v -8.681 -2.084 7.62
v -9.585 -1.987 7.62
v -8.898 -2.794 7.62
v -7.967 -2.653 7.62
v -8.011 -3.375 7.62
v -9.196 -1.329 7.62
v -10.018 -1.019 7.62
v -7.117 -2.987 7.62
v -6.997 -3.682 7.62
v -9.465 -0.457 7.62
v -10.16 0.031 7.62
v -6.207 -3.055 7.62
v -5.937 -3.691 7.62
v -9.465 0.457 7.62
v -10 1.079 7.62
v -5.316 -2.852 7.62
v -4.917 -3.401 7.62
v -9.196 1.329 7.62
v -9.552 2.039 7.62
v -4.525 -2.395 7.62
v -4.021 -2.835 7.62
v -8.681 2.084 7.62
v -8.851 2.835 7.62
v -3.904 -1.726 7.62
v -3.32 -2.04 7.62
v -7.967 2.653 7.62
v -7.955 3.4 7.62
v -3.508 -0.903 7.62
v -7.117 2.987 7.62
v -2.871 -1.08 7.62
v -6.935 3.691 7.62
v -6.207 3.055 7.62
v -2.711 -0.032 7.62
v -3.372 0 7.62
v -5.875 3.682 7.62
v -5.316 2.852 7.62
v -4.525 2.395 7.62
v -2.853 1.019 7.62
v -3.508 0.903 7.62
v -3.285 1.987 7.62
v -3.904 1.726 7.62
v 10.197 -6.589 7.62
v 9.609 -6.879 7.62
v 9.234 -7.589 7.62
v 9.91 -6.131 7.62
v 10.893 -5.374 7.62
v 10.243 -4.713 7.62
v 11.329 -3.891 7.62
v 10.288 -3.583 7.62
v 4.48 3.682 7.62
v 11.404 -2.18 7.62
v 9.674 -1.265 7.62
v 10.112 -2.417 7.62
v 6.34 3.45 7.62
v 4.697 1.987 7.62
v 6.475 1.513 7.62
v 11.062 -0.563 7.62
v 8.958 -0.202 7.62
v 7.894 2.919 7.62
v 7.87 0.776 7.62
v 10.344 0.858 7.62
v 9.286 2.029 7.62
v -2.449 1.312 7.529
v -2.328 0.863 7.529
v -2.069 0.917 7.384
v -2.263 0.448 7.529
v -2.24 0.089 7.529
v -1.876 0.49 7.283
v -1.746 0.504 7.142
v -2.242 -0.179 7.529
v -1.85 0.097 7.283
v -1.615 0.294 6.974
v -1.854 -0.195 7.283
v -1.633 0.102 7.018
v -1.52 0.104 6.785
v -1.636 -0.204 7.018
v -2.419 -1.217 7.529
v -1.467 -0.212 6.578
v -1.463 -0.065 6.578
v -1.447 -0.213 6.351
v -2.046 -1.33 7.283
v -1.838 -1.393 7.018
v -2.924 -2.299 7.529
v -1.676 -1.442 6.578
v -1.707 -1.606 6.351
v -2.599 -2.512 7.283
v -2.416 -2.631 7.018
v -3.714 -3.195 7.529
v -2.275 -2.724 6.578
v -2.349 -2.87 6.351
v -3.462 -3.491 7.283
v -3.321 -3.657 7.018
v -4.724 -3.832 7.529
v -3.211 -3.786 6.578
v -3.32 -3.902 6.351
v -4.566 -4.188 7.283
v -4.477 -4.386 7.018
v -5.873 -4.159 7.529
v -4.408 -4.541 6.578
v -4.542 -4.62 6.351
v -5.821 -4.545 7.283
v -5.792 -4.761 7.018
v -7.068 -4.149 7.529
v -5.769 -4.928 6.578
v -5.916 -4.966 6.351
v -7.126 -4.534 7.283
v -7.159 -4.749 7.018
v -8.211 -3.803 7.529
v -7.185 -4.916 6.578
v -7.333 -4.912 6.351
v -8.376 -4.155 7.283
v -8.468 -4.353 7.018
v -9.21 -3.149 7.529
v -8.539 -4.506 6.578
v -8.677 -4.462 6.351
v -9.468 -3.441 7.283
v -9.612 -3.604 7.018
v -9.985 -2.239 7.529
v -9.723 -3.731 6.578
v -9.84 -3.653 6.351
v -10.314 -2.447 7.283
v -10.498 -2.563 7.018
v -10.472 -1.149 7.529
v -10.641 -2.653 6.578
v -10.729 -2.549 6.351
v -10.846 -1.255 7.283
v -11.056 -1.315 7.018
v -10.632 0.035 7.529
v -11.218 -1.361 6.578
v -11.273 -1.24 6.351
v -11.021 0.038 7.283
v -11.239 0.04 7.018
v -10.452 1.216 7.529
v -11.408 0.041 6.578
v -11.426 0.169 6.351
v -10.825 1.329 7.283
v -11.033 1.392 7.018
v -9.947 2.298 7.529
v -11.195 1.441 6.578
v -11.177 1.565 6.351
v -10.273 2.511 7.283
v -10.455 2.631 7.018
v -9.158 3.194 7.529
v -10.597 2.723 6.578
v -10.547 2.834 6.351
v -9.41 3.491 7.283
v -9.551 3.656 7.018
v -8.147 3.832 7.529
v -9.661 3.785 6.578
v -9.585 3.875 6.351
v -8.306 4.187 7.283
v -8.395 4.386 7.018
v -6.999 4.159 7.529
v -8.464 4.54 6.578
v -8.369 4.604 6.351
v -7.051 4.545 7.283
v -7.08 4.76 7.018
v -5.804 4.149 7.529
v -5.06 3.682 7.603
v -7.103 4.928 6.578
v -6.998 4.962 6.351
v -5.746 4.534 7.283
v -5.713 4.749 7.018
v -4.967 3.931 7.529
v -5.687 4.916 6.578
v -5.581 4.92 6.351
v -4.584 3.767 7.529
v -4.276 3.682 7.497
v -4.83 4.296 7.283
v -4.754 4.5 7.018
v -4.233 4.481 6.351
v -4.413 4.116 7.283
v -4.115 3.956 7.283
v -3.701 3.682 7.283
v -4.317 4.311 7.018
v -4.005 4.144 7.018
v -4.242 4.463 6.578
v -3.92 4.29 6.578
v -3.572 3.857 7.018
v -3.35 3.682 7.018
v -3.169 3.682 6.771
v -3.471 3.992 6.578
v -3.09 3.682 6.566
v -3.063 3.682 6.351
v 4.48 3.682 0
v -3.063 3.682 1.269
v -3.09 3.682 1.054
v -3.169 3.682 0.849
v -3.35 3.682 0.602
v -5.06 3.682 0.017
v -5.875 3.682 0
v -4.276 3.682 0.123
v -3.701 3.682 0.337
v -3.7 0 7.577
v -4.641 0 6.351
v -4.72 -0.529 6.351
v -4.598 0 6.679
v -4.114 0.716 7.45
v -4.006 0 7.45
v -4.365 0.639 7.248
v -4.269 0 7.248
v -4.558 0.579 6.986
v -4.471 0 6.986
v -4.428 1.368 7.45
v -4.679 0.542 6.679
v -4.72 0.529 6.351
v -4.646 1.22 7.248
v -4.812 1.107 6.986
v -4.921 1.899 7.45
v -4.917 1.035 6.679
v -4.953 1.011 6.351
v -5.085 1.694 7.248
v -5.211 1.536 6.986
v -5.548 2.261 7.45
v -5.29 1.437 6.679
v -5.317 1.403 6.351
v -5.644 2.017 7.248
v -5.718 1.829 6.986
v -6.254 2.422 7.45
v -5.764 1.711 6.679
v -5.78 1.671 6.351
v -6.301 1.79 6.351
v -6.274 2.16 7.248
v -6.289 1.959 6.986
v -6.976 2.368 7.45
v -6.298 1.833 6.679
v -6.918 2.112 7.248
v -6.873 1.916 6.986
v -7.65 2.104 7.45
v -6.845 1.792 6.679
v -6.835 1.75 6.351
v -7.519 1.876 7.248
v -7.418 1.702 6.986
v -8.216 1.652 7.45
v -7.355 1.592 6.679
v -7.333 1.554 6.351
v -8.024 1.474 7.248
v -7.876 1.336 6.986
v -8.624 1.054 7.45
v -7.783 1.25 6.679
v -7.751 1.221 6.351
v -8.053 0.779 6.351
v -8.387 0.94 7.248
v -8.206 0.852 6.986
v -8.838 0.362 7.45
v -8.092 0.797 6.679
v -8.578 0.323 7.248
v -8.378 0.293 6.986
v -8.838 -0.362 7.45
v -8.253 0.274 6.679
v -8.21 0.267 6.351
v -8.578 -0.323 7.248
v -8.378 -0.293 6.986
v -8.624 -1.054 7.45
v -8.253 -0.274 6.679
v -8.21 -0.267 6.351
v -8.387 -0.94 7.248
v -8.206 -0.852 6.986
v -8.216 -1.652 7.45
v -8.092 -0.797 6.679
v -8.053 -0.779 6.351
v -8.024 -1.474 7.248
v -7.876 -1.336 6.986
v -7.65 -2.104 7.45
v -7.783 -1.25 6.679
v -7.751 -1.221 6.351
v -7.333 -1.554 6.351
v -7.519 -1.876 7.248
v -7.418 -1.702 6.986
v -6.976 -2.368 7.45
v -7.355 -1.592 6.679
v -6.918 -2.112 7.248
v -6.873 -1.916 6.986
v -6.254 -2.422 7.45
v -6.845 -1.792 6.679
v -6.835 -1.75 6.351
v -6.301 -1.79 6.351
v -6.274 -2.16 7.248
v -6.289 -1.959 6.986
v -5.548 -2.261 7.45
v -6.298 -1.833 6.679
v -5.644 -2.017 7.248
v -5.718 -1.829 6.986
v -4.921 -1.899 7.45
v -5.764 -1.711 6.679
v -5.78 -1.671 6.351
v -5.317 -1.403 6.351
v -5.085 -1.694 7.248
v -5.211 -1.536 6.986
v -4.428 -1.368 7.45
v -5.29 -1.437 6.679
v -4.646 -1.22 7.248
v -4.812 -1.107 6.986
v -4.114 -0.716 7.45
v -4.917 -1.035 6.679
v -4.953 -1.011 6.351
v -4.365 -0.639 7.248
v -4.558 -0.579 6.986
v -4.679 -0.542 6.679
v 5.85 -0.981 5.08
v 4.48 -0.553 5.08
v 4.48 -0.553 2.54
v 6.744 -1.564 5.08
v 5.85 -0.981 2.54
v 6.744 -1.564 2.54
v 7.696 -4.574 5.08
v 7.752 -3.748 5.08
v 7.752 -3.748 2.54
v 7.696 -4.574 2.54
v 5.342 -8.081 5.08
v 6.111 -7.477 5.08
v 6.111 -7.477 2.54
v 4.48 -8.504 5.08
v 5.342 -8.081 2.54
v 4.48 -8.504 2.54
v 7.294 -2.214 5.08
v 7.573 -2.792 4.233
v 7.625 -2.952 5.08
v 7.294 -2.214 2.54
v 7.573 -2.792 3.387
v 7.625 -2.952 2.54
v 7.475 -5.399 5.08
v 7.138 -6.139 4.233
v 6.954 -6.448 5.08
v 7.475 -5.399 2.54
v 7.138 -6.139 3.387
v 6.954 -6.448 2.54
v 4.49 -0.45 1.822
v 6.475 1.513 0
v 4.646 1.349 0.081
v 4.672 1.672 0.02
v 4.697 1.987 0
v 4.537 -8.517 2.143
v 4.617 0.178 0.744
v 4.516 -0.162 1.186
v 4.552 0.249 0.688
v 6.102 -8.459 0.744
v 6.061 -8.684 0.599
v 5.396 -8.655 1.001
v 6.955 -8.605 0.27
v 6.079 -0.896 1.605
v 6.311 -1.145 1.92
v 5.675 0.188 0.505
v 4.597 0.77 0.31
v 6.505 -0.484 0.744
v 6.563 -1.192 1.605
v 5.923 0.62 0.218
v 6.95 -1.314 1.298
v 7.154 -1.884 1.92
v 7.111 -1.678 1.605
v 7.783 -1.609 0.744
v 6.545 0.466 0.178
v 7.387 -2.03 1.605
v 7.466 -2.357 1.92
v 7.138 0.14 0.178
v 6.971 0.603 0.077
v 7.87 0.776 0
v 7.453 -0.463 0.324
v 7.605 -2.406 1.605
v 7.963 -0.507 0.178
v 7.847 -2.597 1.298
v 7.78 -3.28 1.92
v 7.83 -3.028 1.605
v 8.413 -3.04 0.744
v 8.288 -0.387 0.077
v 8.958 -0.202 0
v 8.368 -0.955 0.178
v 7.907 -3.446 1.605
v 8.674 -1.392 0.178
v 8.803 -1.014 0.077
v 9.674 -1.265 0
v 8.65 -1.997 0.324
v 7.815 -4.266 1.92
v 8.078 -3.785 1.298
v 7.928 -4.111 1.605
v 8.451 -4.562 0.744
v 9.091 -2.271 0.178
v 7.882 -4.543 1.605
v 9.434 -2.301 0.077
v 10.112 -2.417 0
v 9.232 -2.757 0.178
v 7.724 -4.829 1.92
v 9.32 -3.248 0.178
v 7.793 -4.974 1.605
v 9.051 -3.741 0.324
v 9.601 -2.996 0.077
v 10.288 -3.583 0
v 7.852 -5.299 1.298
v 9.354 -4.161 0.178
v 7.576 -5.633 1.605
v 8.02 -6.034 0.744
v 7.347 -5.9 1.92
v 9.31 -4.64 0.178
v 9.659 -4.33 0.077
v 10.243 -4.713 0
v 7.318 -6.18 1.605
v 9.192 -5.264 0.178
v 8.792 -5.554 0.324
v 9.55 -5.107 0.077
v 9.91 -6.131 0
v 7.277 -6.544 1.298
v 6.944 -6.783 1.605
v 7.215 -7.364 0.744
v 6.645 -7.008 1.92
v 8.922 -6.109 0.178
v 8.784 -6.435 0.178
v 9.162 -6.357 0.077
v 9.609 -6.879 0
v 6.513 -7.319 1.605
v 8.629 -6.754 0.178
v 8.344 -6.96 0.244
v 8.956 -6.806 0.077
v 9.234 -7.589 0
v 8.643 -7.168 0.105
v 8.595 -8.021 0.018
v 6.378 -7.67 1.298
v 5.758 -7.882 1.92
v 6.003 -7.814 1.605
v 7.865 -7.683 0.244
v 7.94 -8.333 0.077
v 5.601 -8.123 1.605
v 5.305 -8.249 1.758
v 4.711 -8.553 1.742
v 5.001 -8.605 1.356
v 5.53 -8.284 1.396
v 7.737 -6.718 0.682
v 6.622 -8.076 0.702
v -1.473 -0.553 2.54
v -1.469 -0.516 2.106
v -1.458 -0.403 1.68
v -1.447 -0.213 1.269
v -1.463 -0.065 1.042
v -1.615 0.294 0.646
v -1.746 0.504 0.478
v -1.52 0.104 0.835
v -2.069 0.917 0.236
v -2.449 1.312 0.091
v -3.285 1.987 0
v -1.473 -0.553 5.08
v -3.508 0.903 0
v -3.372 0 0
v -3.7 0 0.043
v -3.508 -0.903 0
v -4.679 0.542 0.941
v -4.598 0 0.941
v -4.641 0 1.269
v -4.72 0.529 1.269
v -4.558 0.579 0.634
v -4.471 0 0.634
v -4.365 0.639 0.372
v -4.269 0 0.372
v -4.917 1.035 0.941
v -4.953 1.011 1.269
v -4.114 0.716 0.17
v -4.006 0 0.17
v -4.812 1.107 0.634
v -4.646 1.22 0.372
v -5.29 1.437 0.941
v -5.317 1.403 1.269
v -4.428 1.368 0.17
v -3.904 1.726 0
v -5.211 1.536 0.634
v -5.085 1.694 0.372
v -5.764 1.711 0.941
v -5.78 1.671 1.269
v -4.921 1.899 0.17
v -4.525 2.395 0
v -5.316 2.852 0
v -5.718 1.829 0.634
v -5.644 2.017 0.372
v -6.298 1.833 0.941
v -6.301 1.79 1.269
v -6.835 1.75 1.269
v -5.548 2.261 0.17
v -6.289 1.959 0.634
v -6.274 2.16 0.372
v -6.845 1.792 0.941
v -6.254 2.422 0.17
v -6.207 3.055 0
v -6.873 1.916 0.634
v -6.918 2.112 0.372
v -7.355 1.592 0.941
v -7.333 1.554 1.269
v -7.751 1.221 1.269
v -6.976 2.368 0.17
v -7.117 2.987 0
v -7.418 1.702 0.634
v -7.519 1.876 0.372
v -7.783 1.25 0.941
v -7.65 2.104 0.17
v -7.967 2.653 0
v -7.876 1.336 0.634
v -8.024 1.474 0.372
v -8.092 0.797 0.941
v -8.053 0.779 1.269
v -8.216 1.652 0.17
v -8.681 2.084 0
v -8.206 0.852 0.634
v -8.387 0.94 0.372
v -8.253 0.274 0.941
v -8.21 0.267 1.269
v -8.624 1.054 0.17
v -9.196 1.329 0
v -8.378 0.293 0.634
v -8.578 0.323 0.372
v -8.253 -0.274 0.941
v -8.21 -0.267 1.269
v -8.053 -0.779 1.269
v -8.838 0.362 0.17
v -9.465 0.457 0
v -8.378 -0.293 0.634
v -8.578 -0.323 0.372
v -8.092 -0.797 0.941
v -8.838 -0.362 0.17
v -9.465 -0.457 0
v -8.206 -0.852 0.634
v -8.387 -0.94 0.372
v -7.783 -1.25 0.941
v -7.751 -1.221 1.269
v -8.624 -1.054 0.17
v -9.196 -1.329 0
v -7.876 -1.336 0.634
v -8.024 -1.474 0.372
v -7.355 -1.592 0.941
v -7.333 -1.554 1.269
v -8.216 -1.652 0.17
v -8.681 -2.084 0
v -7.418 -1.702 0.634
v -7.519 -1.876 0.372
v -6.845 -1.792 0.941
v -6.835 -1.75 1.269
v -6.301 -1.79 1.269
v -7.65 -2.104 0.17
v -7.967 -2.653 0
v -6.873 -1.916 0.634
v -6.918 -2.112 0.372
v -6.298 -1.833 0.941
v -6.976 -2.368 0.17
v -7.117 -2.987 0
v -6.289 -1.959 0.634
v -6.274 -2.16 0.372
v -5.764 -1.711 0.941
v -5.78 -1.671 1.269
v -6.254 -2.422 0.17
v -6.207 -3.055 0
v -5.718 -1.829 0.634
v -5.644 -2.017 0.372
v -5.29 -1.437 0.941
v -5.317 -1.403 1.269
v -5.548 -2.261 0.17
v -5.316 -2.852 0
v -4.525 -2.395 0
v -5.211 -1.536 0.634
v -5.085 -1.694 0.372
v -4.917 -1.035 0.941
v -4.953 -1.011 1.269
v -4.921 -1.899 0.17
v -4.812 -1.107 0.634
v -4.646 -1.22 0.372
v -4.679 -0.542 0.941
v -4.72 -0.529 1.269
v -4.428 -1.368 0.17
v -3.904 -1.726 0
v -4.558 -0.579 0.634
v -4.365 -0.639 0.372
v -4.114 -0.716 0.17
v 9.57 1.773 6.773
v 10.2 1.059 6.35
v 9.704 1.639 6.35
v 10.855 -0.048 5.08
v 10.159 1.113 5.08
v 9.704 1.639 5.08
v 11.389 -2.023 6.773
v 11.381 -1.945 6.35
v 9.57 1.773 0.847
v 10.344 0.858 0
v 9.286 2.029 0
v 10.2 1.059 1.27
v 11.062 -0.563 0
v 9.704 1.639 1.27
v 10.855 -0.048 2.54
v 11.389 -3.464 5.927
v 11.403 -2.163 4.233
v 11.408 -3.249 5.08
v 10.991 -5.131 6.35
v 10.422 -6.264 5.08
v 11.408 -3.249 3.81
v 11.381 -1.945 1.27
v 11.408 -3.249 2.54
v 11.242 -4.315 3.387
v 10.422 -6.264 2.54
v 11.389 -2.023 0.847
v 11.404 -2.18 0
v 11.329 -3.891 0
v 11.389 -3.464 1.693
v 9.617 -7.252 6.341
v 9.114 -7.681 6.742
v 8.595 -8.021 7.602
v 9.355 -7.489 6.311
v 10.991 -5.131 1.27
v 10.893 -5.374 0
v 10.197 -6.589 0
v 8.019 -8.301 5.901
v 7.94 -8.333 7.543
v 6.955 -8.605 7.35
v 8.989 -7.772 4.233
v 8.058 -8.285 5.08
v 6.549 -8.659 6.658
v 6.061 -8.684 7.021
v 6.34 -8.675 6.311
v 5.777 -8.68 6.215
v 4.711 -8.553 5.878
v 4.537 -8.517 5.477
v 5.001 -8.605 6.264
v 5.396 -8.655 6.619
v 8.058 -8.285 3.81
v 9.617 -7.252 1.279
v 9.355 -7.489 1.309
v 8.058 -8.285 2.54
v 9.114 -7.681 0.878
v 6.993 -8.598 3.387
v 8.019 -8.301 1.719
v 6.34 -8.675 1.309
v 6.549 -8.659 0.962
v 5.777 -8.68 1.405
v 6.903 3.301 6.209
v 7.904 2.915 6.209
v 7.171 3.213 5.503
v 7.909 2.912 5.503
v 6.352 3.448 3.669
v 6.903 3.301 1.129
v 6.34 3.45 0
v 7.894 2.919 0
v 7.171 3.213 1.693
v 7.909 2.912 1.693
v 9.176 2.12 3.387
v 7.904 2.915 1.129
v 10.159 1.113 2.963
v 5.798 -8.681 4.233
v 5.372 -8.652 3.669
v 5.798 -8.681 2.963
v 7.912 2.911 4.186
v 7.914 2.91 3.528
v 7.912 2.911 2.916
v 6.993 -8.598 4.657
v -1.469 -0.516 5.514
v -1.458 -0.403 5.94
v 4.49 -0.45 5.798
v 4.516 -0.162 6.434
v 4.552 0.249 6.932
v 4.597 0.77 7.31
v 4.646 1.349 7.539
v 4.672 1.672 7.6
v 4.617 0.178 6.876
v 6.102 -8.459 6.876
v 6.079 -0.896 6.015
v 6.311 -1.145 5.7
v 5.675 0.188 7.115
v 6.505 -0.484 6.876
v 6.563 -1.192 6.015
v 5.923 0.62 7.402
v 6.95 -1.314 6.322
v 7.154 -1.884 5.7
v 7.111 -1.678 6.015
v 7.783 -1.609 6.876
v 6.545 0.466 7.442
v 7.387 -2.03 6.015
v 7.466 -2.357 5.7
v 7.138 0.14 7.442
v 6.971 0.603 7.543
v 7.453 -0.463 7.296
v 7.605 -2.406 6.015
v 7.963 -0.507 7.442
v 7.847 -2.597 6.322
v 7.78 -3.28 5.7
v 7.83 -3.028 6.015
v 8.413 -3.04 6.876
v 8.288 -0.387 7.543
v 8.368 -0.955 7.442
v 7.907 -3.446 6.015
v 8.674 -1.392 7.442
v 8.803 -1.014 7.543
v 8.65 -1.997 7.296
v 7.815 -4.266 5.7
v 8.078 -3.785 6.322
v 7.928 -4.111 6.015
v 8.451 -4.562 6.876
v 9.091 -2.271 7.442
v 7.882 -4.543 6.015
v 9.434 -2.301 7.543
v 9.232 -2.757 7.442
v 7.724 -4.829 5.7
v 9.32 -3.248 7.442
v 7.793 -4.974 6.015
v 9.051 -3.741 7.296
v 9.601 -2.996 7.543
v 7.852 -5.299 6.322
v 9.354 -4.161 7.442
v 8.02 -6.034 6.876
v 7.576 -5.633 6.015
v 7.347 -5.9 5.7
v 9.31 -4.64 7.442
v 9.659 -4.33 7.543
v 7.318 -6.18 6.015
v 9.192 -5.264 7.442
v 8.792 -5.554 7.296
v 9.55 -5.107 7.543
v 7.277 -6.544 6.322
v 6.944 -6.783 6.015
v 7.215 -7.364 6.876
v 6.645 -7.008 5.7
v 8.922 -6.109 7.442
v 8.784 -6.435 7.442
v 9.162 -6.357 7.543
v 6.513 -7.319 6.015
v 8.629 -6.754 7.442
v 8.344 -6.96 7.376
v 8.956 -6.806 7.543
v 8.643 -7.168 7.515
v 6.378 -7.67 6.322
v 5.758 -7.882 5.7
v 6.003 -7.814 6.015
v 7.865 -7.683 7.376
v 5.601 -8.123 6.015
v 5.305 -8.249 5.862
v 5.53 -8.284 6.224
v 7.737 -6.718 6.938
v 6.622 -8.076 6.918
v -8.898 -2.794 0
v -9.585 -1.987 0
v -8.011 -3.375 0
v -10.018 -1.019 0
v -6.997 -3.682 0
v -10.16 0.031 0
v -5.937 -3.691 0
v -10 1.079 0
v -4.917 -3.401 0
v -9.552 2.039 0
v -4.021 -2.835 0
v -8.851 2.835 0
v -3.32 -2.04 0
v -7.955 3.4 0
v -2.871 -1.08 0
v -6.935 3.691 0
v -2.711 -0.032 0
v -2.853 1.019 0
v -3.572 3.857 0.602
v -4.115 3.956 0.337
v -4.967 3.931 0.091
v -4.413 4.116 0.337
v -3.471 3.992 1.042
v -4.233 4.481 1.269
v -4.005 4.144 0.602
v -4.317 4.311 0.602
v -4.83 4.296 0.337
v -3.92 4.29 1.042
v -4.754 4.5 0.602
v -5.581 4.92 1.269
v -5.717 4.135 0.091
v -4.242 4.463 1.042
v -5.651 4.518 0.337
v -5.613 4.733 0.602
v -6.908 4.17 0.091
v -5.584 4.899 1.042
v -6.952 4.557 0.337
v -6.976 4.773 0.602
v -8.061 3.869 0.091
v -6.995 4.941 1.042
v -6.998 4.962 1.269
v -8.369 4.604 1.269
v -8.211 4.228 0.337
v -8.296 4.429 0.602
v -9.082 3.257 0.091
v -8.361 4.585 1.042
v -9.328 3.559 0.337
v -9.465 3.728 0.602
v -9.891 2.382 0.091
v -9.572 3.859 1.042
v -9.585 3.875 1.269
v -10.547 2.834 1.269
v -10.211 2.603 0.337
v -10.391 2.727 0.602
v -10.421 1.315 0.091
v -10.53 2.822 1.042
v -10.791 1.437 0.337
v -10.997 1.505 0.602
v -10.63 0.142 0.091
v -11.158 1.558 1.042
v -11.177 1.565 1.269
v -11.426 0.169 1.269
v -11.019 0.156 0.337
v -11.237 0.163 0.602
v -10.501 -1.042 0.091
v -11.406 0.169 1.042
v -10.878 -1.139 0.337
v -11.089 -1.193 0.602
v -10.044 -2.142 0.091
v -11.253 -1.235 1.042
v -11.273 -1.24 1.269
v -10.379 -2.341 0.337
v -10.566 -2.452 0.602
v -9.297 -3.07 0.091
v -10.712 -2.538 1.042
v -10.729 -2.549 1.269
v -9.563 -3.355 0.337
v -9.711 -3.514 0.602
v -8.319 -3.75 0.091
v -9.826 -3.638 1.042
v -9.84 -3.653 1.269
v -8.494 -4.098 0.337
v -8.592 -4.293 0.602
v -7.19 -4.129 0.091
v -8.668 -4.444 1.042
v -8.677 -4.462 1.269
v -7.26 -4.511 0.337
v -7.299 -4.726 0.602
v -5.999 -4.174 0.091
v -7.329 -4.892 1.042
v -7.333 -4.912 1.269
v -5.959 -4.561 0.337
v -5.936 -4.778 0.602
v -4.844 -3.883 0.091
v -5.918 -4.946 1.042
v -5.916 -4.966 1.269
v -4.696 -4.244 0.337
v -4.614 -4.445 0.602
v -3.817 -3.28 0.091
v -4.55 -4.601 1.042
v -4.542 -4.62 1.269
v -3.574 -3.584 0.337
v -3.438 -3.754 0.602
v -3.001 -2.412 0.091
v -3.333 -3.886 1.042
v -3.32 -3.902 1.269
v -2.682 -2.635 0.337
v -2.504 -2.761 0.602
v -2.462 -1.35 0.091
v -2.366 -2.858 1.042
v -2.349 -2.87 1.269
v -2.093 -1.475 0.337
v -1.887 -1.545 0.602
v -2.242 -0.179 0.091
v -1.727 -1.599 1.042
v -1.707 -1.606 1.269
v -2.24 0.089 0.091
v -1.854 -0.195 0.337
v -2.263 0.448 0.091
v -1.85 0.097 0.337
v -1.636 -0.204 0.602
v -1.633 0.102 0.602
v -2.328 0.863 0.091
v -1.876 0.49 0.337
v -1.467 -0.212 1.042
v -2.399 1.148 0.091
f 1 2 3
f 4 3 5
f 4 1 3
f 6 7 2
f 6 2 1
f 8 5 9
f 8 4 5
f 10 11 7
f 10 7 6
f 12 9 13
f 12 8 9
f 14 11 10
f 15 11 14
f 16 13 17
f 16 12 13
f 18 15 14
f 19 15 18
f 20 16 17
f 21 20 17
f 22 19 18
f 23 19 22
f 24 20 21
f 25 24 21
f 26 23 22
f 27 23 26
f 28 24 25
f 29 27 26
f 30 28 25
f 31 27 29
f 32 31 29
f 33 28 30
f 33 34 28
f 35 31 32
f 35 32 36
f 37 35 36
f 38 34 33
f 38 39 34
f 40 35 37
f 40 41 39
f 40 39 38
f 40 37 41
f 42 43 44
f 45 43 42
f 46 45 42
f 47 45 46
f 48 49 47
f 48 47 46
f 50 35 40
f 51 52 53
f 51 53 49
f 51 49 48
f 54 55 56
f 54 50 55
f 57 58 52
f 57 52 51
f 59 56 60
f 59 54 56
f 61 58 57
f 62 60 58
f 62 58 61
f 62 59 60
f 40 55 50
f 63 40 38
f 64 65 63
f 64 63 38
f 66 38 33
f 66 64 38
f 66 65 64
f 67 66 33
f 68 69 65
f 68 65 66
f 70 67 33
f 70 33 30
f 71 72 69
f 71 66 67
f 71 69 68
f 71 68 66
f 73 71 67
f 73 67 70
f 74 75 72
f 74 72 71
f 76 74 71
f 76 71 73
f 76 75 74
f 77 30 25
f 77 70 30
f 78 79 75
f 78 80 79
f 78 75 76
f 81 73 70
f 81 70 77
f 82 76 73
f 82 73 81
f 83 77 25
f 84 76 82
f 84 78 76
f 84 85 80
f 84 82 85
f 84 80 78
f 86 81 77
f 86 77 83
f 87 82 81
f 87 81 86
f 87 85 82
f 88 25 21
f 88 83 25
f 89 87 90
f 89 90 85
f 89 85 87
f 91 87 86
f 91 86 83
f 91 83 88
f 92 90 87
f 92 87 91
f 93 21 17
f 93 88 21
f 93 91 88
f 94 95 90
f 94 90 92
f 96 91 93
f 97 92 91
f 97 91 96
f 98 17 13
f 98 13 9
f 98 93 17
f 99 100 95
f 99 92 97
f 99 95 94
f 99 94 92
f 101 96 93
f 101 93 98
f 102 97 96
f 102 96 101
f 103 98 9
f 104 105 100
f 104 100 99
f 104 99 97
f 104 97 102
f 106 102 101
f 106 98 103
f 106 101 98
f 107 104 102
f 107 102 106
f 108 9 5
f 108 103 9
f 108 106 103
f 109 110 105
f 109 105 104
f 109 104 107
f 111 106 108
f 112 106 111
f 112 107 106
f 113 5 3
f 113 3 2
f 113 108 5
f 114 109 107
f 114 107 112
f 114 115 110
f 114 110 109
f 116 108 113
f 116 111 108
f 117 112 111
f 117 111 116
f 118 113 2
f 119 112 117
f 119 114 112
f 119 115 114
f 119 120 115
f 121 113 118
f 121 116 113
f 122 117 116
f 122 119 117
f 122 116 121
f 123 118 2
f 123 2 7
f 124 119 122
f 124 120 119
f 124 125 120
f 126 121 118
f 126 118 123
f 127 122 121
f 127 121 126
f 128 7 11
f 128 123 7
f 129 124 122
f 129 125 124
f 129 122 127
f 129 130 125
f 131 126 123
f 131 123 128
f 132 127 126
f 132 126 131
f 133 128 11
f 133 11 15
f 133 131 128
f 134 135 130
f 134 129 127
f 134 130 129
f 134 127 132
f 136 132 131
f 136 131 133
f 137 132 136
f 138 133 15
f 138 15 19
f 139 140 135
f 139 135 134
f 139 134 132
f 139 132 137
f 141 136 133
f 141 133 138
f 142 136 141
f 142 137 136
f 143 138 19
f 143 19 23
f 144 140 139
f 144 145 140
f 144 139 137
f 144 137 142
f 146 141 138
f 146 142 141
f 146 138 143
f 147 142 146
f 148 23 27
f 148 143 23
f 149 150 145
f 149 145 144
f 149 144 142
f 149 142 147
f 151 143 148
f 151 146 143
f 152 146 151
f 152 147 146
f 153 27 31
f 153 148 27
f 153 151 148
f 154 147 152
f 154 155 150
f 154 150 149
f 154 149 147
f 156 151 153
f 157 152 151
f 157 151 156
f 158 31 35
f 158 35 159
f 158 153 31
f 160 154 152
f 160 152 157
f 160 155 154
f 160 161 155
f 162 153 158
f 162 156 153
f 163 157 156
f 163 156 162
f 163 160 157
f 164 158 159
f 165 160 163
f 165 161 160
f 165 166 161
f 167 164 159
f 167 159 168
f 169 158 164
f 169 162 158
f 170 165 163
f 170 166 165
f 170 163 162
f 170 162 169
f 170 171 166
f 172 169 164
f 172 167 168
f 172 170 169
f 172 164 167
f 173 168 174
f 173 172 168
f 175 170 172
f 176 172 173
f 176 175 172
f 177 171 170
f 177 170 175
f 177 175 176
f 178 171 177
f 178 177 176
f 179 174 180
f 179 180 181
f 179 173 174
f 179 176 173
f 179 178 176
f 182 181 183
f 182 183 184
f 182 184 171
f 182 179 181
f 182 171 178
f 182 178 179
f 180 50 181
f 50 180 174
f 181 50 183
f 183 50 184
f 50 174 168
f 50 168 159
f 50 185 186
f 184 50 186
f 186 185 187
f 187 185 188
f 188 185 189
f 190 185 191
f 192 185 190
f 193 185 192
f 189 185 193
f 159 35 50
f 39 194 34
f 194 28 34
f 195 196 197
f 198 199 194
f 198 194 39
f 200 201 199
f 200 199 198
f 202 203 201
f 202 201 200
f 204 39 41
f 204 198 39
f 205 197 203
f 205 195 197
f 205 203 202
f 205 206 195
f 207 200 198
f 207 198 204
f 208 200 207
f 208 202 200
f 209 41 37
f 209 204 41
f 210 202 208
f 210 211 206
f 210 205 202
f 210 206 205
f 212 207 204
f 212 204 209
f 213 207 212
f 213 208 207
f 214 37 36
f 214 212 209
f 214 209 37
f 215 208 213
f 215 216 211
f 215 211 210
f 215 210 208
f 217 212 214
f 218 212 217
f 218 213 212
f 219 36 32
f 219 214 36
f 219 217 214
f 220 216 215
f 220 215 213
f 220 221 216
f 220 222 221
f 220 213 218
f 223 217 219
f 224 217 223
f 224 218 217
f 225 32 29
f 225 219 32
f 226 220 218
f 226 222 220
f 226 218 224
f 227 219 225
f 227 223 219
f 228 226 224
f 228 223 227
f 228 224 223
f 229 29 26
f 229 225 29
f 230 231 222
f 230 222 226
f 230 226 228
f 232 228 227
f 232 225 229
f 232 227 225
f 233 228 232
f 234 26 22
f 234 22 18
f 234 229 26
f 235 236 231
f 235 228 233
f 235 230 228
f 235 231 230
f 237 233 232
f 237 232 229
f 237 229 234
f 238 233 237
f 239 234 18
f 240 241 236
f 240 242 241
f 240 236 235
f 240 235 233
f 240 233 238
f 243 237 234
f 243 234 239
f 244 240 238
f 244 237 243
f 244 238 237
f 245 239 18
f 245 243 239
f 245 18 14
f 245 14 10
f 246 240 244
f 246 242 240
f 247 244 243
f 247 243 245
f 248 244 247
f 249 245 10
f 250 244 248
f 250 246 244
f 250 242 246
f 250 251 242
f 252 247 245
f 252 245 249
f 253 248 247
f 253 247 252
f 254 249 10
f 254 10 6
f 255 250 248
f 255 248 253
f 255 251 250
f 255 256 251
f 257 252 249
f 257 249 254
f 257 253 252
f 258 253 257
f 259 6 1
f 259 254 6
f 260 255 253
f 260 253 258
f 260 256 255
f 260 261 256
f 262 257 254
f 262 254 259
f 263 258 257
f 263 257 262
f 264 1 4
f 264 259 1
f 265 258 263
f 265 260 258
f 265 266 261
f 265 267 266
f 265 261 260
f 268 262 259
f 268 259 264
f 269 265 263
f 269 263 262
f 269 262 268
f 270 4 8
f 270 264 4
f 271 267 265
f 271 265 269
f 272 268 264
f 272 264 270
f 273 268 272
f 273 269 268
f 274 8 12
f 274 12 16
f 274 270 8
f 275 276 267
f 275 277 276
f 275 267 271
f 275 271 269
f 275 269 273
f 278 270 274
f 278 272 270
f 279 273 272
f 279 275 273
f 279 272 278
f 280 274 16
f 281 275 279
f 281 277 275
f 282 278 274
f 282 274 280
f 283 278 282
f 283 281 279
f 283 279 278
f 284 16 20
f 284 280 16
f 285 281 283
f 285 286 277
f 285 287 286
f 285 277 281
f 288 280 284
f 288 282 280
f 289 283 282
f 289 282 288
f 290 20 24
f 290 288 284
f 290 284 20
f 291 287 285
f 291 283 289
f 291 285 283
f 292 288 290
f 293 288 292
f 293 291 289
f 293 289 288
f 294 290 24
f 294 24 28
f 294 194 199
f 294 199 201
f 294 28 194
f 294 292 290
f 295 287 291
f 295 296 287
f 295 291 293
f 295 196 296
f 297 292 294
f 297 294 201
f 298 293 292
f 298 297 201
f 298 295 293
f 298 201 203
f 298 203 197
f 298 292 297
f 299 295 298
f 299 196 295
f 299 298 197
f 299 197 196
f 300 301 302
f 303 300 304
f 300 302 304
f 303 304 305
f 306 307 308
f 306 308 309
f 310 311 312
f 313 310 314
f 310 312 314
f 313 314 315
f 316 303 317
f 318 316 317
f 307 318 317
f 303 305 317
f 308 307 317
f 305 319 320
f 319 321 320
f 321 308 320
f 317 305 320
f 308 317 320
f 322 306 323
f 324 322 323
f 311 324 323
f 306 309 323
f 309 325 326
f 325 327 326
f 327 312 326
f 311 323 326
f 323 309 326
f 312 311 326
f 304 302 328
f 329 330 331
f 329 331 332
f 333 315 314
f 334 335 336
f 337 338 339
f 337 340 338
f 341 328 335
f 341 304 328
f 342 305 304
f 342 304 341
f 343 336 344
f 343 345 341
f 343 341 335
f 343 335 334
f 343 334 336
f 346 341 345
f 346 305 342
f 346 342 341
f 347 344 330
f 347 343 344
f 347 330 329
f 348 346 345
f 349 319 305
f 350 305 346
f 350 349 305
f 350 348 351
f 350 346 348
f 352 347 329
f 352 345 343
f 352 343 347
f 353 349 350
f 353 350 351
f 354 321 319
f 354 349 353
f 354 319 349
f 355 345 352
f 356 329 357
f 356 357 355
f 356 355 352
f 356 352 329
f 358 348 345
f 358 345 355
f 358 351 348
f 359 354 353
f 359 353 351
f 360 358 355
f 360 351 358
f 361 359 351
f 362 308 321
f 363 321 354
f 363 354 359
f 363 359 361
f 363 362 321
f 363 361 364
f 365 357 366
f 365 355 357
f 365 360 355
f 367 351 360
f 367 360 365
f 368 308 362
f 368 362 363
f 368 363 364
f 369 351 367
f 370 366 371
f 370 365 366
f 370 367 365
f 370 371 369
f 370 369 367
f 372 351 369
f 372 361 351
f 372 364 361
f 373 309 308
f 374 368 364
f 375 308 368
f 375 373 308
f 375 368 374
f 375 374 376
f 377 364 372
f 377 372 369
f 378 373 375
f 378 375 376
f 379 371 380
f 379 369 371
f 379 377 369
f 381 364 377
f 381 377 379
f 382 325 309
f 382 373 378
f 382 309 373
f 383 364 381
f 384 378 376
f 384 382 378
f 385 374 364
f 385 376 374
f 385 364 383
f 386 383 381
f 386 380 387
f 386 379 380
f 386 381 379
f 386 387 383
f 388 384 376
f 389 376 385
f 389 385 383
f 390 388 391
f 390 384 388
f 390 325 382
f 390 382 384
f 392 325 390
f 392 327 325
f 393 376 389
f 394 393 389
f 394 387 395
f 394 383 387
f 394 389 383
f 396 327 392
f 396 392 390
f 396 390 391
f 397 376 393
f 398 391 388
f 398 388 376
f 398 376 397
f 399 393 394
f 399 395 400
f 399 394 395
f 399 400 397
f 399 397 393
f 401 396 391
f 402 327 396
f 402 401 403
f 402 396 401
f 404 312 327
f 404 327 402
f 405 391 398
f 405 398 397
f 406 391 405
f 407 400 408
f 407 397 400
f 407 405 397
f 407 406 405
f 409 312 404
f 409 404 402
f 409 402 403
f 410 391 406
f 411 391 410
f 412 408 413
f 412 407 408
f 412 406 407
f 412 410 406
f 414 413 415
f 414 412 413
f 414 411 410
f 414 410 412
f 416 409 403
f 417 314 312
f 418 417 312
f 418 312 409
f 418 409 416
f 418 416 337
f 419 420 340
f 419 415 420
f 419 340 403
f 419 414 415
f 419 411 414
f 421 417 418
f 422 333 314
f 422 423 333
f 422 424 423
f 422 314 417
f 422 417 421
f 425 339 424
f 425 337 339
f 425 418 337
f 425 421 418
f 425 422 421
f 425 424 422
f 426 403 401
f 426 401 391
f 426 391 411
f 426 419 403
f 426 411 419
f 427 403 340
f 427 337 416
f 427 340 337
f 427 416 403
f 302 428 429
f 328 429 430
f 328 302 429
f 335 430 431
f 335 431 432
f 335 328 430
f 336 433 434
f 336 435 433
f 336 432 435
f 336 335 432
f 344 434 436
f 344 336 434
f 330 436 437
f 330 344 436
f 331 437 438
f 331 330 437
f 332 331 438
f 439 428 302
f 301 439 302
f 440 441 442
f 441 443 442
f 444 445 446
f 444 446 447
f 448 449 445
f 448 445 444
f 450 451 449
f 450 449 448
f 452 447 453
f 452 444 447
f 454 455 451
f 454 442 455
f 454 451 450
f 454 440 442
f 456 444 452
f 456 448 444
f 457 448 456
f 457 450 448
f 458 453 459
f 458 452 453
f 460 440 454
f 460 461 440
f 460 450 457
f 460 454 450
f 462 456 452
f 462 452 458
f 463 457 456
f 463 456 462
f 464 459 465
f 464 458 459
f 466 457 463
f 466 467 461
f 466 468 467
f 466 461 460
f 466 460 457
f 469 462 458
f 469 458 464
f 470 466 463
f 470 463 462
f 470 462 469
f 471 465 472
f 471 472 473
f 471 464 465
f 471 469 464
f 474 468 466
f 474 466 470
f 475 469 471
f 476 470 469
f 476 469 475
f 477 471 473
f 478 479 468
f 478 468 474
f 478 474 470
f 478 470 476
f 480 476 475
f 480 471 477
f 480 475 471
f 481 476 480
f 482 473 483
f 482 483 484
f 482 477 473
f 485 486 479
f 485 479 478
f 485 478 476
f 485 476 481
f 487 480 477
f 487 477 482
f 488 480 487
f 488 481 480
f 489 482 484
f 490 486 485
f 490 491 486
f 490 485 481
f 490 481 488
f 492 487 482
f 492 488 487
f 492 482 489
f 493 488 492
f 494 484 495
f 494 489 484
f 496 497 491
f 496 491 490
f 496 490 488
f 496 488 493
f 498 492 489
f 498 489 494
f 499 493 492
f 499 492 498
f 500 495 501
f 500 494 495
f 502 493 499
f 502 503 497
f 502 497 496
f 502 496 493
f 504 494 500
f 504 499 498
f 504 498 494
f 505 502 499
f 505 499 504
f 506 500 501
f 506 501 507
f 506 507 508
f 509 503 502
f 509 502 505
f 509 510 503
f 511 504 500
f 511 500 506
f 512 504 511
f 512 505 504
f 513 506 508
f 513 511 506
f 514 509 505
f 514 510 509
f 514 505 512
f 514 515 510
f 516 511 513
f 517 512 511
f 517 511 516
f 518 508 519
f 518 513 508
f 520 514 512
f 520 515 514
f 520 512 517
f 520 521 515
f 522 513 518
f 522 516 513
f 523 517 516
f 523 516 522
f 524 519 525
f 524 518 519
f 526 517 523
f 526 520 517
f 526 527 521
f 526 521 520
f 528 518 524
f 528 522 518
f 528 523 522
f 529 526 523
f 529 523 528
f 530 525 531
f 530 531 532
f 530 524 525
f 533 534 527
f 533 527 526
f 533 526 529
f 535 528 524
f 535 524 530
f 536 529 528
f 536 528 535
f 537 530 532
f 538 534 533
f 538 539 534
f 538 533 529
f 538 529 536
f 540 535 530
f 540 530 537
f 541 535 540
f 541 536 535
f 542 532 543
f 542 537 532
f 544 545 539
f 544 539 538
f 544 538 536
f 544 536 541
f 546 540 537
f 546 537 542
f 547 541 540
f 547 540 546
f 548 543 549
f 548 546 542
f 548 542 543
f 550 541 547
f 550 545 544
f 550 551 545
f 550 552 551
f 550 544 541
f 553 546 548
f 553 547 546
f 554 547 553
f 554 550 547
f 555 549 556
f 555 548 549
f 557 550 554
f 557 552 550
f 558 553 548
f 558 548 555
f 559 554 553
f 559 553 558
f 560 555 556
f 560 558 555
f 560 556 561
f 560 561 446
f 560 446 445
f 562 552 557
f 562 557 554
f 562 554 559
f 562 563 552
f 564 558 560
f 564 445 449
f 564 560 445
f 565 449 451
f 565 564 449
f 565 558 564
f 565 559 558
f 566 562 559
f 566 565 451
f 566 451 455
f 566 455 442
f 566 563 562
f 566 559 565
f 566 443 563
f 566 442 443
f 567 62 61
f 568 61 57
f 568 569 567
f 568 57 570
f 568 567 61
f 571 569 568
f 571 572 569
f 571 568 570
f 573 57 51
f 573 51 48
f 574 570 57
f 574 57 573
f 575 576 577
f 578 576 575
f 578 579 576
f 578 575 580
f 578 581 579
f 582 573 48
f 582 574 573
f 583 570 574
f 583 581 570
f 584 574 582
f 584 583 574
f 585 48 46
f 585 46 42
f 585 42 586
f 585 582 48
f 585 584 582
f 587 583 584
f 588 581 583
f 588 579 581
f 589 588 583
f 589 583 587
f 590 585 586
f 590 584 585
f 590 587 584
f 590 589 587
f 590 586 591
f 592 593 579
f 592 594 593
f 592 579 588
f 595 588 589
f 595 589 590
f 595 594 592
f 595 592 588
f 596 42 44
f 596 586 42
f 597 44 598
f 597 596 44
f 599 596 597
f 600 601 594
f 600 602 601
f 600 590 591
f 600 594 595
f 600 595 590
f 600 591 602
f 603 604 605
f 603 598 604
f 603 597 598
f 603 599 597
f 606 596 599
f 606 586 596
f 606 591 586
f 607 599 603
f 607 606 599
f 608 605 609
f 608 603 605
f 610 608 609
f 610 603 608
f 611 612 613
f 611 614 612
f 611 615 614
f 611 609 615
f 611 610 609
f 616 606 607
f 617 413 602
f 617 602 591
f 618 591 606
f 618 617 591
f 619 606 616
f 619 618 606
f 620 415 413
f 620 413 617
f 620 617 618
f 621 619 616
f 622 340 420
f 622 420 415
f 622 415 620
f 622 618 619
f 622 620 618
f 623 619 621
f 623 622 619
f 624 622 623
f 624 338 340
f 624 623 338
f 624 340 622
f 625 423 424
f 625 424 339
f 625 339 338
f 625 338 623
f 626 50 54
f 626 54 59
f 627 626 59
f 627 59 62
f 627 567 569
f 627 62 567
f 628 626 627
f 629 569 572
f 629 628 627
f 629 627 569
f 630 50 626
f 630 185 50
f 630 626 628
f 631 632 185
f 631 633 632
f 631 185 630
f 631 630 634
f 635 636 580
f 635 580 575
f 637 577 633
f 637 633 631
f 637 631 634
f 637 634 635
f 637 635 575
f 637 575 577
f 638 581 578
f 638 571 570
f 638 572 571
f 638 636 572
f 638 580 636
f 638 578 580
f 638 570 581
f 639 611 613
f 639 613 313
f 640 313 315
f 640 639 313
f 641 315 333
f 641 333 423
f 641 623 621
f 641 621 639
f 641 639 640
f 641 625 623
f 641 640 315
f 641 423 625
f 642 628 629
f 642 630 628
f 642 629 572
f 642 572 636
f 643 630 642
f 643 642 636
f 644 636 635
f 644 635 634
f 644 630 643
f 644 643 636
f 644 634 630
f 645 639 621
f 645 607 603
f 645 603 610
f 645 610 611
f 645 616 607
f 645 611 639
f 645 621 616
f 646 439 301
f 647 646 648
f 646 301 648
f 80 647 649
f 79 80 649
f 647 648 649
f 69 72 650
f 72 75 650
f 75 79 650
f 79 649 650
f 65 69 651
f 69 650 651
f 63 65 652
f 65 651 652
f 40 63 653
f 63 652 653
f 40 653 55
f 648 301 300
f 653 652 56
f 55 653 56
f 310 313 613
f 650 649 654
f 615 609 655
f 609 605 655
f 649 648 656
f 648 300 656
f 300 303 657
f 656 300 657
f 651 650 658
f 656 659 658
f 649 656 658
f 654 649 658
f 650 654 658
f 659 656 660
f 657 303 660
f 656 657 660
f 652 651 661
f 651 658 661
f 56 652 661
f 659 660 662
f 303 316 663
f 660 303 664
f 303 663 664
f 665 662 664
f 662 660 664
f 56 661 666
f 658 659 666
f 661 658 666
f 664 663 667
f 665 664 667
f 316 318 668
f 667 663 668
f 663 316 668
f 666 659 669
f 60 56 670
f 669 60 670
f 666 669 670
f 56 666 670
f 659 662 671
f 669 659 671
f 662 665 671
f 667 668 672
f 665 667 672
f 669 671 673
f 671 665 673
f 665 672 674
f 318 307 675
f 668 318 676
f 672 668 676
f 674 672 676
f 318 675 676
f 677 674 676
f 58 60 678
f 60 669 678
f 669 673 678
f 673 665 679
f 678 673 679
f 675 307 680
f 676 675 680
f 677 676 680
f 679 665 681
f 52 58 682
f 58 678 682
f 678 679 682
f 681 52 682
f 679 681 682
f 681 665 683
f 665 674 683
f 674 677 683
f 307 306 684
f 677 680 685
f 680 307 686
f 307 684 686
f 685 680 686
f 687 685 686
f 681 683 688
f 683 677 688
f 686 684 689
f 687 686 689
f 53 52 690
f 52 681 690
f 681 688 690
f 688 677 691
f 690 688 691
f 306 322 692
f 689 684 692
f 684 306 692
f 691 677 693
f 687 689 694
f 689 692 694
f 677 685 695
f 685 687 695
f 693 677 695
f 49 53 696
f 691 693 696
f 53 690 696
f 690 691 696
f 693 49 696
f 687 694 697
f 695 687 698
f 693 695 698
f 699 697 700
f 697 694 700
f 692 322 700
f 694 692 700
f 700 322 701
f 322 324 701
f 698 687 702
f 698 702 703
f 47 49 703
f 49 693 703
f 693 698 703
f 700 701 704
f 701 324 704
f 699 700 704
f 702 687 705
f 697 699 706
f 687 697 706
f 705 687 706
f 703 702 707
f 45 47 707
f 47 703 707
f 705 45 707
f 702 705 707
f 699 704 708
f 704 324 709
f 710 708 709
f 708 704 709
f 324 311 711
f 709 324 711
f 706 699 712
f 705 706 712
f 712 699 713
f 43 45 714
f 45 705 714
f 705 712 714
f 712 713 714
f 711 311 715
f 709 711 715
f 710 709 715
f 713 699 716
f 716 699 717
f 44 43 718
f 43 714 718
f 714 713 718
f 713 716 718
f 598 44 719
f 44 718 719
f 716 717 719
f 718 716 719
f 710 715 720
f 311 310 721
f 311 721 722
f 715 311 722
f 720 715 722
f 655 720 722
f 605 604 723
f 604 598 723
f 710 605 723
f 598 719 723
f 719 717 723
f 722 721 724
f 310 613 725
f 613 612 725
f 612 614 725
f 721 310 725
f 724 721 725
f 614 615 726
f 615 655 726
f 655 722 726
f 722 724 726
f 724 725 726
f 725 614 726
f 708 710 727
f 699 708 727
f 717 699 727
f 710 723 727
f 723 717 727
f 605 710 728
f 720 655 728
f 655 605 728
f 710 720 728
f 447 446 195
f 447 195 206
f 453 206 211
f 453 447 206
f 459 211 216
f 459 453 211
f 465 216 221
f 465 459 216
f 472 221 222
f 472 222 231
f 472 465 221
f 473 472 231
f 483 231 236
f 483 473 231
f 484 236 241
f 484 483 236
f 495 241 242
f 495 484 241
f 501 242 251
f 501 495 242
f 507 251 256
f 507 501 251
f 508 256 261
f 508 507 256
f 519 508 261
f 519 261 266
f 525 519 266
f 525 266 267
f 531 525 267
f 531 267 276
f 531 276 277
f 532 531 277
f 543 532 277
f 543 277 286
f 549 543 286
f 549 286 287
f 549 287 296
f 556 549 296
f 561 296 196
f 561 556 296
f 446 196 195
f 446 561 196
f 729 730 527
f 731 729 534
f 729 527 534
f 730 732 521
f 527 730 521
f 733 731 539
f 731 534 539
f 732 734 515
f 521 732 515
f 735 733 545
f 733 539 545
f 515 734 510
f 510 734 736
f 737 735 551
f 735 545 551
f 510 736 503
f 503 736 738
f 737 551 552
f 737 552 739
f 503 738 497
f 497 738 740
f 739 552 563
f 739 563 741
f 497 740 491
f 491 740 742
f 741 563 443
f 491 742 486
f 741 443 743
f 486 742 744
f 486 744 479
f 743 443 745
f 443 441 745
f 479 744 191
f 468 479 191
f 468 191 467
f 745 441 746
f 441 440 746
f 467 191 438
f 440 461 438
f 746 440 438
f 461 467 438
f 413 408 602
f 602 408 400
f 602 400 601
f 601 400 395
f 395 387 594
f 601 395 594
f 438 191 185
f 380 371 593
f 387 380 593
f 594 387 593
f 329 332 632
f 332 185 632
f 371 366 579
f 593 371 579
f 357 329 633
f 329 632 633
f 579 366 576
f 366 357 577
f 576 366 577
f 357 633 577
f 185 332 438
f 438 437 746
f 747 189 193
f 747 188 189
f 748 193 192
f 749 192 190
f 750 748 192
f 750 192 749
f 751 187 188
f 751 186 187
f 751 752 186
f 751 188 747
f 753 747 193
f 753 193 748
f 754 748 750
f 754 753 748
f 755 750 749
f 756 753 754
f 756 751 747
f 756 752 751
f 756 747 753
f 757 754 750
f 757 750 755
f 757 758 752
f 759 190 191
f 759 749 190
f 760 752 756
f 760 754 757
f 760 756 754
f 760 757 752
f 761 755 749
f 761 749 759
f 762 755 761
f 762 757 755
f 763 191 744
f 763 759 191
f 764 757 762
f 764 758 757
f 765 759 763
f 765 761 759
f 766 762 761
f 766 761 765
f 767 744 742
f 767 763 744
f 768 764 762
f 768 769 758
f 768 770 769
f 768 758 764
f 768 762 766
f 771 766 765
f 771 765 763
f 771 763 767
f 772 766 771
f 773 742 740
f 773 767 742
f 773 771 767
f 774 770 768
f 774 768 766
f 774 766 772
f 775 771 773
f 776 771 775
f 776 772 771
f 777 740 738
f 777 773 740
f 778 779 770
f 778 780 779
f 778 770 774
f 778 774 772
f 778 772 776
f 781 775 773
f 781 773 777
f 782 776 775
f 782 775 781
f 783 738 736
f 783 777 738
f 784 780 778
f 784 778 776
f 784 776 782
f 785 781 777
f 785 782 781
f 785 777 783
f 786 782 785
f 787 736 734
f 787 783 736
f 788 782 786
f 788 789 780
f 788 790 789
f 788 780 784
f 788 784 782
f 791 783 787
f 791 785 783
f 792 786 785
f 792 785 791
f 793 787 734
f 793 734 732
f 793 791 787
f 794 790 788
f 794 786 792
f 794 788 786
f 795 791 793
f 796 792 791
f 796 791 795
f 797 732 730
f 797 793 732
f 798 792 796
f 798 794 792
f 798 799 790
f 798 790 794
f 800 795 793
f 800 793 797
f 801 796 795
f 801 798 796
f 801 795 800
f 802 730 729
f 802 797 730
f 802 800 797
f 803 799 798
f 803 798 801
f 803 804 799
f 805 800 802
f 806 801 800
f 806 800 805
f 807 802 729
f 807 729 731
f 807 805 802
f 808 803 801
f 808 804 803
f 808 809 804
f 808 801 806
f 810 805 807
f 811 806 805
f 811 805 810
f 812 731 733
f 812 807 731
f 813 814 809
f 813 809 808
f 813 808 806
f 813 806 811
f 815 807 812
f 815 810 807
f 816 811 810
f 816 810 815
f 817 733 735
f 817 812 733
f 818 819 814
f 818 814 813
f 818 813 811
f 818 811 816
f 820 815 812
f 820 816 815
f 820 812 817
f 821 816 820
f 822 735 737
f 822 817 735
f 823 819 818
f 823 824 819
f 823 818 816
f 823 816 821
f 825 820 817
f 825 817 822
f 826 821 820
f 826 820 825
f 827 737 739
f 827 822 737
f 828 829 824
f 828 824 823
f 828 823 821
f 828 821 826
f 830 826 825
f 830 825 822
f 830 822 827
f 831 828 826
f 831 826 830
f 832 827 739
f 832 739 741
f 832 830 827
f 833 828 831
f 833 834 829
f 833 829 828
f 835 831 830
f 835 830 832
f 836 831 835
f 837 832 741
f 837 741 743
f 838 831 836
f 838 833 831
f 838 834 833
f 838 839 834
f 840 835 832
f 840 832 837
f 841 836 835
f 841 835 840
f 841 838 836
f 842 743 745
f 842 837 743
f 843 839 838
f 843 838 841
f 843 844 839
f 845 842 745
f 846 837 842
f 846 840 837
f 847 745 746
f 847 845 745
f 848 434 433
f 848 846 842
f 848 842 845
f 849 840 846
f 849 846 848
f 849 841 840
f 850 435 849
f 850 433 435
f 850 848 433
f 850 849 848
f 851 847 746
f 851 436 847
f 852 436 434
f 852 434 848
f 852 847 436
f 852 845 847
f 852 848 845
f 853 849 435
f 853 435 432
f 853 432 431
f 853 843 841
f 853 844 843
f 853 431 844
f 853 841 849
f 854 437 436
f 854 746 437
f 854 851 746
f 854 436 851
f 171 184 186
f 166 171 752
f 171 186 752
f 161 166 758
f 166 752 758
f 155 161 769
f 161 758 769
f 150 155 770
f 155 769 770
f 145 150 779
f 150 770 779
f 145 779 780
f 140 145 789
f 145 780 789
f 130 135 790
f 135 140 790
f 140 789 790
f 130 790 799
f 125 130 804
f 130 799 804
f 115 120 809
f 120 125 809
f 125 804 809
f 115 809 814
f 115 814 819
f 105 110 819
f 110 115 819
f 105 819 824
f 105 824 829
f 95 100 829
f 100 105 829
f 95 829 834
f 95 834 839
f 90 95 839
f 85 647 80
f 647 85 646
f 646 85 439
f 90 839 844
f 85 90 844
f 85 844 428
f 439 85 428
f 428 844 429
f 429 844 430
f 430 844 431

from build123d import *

# Parameters (mm, degrees)
F0_R     = 1.7947651686
F1_DEPTH = 7.62
F2_R     = 2.54
F3_R     = 1.269


# Not quite as in the source:
# - a fillet or chamfer is up to 0.001 mm smaller than in the source, because OpenCascade refuses the exact size


with BuildPart() as f1:
    # F0 (on Top) → F1 (new body)
    with BuildSketch(Plane.XY):
        with BuildLine():
            ThreePointArc((-3.0625740785, 3.6819641418), (-1.865183548, 2.011379827), (-1.4421620036, 0))
            ThreePointArc((-1.4421620036, 0), (-1.4498583422, -0.2771315824), (-1.4729236329, -0.5534088705))
            Line((-1.4729236329, -0.5534088705), (4.4801407494, -0.5534088705))
            Line((4.4801407494, -0.5534088705), (4.4801407494, 3.6819641418))
            Line((4.4801407494, 3.6819641418), (-3.0625740785, 3.6819641418))
        make_face()
        with BuildLine():
            add(Edge.make_bspline(
                [(4.4801407494, 3.6819641418), (14.6919268718, 3.3504103776), (12.7431834117, -10.4070426896), (4.4801407494, -8.5037574172)],
                knots=[0, 0, 0, 0, 12.185721559, 12.185721559, 12.185721559, 12.185721559], degree=3))
            Line((4.4801407494, 3.6819641418), (4.4801407494, -0.5534088705))
            add(Edge.make_bspline(
                [(4.4801407494, -0.5534088705), (9.772202, -1.5405191807), (7.8137687942, -7.3264148086), (4.4801407494, -8.5037574172)],
                knots=[0, 0, 0, 0, 7.9503485467, 7.9503485467, 7.9503485467, 7.9503485467], degree=3))
        make_face()
        with BuildLine():
            ThreePointArc((-1.4729236329, -0.5534088705), (-1.4498583422, -0.2771315824), (-1.4421620036, 0))
            ThreePointArc((-1.4421620036, 0), (-1.865183548, 2.011379827), (-3.0625740785, 3.6819641418))
            ThreePointArc((-3.0625740785, 3.6819641418), (-11.1104438204, -1.7546257881), (-1.4729236329, -0.5534088705))
        make_face()
        with Locations((-6.4355200157, 0)):
            Circle(F0_R, mode=Mode.SUBTRACT)
    extrude(amount=F1_DEPTH)

    # F2
    f2_edges = [f1.edges().sort_by_distance(p)[0] for p in [
        (1.503609, -0.553409, 7.62),
        (7.731849, -4.321745, 7.62),
        (1.503609, -0.553409, 0),
        (7.731849, -4.321745, 0),
    ]]
    fillet(f2_edges, radius=F2_R)

    # F3 (radius 1.27 in the source; OpenCascade refuses exactly that, so slightly less here)
    f3_edges = [f1.edges().sort_by_distance(p)[0] for p in [
        (-11.110444, -1.754626, 7.62),
        (-11.110444, -1.754626, 0),
        (-8.230285, 0, 0),
        (-8.230285, 0, 7.62),
    ]]
    fillet(f3_edges, radius=F3_R)


solid = f1.part
